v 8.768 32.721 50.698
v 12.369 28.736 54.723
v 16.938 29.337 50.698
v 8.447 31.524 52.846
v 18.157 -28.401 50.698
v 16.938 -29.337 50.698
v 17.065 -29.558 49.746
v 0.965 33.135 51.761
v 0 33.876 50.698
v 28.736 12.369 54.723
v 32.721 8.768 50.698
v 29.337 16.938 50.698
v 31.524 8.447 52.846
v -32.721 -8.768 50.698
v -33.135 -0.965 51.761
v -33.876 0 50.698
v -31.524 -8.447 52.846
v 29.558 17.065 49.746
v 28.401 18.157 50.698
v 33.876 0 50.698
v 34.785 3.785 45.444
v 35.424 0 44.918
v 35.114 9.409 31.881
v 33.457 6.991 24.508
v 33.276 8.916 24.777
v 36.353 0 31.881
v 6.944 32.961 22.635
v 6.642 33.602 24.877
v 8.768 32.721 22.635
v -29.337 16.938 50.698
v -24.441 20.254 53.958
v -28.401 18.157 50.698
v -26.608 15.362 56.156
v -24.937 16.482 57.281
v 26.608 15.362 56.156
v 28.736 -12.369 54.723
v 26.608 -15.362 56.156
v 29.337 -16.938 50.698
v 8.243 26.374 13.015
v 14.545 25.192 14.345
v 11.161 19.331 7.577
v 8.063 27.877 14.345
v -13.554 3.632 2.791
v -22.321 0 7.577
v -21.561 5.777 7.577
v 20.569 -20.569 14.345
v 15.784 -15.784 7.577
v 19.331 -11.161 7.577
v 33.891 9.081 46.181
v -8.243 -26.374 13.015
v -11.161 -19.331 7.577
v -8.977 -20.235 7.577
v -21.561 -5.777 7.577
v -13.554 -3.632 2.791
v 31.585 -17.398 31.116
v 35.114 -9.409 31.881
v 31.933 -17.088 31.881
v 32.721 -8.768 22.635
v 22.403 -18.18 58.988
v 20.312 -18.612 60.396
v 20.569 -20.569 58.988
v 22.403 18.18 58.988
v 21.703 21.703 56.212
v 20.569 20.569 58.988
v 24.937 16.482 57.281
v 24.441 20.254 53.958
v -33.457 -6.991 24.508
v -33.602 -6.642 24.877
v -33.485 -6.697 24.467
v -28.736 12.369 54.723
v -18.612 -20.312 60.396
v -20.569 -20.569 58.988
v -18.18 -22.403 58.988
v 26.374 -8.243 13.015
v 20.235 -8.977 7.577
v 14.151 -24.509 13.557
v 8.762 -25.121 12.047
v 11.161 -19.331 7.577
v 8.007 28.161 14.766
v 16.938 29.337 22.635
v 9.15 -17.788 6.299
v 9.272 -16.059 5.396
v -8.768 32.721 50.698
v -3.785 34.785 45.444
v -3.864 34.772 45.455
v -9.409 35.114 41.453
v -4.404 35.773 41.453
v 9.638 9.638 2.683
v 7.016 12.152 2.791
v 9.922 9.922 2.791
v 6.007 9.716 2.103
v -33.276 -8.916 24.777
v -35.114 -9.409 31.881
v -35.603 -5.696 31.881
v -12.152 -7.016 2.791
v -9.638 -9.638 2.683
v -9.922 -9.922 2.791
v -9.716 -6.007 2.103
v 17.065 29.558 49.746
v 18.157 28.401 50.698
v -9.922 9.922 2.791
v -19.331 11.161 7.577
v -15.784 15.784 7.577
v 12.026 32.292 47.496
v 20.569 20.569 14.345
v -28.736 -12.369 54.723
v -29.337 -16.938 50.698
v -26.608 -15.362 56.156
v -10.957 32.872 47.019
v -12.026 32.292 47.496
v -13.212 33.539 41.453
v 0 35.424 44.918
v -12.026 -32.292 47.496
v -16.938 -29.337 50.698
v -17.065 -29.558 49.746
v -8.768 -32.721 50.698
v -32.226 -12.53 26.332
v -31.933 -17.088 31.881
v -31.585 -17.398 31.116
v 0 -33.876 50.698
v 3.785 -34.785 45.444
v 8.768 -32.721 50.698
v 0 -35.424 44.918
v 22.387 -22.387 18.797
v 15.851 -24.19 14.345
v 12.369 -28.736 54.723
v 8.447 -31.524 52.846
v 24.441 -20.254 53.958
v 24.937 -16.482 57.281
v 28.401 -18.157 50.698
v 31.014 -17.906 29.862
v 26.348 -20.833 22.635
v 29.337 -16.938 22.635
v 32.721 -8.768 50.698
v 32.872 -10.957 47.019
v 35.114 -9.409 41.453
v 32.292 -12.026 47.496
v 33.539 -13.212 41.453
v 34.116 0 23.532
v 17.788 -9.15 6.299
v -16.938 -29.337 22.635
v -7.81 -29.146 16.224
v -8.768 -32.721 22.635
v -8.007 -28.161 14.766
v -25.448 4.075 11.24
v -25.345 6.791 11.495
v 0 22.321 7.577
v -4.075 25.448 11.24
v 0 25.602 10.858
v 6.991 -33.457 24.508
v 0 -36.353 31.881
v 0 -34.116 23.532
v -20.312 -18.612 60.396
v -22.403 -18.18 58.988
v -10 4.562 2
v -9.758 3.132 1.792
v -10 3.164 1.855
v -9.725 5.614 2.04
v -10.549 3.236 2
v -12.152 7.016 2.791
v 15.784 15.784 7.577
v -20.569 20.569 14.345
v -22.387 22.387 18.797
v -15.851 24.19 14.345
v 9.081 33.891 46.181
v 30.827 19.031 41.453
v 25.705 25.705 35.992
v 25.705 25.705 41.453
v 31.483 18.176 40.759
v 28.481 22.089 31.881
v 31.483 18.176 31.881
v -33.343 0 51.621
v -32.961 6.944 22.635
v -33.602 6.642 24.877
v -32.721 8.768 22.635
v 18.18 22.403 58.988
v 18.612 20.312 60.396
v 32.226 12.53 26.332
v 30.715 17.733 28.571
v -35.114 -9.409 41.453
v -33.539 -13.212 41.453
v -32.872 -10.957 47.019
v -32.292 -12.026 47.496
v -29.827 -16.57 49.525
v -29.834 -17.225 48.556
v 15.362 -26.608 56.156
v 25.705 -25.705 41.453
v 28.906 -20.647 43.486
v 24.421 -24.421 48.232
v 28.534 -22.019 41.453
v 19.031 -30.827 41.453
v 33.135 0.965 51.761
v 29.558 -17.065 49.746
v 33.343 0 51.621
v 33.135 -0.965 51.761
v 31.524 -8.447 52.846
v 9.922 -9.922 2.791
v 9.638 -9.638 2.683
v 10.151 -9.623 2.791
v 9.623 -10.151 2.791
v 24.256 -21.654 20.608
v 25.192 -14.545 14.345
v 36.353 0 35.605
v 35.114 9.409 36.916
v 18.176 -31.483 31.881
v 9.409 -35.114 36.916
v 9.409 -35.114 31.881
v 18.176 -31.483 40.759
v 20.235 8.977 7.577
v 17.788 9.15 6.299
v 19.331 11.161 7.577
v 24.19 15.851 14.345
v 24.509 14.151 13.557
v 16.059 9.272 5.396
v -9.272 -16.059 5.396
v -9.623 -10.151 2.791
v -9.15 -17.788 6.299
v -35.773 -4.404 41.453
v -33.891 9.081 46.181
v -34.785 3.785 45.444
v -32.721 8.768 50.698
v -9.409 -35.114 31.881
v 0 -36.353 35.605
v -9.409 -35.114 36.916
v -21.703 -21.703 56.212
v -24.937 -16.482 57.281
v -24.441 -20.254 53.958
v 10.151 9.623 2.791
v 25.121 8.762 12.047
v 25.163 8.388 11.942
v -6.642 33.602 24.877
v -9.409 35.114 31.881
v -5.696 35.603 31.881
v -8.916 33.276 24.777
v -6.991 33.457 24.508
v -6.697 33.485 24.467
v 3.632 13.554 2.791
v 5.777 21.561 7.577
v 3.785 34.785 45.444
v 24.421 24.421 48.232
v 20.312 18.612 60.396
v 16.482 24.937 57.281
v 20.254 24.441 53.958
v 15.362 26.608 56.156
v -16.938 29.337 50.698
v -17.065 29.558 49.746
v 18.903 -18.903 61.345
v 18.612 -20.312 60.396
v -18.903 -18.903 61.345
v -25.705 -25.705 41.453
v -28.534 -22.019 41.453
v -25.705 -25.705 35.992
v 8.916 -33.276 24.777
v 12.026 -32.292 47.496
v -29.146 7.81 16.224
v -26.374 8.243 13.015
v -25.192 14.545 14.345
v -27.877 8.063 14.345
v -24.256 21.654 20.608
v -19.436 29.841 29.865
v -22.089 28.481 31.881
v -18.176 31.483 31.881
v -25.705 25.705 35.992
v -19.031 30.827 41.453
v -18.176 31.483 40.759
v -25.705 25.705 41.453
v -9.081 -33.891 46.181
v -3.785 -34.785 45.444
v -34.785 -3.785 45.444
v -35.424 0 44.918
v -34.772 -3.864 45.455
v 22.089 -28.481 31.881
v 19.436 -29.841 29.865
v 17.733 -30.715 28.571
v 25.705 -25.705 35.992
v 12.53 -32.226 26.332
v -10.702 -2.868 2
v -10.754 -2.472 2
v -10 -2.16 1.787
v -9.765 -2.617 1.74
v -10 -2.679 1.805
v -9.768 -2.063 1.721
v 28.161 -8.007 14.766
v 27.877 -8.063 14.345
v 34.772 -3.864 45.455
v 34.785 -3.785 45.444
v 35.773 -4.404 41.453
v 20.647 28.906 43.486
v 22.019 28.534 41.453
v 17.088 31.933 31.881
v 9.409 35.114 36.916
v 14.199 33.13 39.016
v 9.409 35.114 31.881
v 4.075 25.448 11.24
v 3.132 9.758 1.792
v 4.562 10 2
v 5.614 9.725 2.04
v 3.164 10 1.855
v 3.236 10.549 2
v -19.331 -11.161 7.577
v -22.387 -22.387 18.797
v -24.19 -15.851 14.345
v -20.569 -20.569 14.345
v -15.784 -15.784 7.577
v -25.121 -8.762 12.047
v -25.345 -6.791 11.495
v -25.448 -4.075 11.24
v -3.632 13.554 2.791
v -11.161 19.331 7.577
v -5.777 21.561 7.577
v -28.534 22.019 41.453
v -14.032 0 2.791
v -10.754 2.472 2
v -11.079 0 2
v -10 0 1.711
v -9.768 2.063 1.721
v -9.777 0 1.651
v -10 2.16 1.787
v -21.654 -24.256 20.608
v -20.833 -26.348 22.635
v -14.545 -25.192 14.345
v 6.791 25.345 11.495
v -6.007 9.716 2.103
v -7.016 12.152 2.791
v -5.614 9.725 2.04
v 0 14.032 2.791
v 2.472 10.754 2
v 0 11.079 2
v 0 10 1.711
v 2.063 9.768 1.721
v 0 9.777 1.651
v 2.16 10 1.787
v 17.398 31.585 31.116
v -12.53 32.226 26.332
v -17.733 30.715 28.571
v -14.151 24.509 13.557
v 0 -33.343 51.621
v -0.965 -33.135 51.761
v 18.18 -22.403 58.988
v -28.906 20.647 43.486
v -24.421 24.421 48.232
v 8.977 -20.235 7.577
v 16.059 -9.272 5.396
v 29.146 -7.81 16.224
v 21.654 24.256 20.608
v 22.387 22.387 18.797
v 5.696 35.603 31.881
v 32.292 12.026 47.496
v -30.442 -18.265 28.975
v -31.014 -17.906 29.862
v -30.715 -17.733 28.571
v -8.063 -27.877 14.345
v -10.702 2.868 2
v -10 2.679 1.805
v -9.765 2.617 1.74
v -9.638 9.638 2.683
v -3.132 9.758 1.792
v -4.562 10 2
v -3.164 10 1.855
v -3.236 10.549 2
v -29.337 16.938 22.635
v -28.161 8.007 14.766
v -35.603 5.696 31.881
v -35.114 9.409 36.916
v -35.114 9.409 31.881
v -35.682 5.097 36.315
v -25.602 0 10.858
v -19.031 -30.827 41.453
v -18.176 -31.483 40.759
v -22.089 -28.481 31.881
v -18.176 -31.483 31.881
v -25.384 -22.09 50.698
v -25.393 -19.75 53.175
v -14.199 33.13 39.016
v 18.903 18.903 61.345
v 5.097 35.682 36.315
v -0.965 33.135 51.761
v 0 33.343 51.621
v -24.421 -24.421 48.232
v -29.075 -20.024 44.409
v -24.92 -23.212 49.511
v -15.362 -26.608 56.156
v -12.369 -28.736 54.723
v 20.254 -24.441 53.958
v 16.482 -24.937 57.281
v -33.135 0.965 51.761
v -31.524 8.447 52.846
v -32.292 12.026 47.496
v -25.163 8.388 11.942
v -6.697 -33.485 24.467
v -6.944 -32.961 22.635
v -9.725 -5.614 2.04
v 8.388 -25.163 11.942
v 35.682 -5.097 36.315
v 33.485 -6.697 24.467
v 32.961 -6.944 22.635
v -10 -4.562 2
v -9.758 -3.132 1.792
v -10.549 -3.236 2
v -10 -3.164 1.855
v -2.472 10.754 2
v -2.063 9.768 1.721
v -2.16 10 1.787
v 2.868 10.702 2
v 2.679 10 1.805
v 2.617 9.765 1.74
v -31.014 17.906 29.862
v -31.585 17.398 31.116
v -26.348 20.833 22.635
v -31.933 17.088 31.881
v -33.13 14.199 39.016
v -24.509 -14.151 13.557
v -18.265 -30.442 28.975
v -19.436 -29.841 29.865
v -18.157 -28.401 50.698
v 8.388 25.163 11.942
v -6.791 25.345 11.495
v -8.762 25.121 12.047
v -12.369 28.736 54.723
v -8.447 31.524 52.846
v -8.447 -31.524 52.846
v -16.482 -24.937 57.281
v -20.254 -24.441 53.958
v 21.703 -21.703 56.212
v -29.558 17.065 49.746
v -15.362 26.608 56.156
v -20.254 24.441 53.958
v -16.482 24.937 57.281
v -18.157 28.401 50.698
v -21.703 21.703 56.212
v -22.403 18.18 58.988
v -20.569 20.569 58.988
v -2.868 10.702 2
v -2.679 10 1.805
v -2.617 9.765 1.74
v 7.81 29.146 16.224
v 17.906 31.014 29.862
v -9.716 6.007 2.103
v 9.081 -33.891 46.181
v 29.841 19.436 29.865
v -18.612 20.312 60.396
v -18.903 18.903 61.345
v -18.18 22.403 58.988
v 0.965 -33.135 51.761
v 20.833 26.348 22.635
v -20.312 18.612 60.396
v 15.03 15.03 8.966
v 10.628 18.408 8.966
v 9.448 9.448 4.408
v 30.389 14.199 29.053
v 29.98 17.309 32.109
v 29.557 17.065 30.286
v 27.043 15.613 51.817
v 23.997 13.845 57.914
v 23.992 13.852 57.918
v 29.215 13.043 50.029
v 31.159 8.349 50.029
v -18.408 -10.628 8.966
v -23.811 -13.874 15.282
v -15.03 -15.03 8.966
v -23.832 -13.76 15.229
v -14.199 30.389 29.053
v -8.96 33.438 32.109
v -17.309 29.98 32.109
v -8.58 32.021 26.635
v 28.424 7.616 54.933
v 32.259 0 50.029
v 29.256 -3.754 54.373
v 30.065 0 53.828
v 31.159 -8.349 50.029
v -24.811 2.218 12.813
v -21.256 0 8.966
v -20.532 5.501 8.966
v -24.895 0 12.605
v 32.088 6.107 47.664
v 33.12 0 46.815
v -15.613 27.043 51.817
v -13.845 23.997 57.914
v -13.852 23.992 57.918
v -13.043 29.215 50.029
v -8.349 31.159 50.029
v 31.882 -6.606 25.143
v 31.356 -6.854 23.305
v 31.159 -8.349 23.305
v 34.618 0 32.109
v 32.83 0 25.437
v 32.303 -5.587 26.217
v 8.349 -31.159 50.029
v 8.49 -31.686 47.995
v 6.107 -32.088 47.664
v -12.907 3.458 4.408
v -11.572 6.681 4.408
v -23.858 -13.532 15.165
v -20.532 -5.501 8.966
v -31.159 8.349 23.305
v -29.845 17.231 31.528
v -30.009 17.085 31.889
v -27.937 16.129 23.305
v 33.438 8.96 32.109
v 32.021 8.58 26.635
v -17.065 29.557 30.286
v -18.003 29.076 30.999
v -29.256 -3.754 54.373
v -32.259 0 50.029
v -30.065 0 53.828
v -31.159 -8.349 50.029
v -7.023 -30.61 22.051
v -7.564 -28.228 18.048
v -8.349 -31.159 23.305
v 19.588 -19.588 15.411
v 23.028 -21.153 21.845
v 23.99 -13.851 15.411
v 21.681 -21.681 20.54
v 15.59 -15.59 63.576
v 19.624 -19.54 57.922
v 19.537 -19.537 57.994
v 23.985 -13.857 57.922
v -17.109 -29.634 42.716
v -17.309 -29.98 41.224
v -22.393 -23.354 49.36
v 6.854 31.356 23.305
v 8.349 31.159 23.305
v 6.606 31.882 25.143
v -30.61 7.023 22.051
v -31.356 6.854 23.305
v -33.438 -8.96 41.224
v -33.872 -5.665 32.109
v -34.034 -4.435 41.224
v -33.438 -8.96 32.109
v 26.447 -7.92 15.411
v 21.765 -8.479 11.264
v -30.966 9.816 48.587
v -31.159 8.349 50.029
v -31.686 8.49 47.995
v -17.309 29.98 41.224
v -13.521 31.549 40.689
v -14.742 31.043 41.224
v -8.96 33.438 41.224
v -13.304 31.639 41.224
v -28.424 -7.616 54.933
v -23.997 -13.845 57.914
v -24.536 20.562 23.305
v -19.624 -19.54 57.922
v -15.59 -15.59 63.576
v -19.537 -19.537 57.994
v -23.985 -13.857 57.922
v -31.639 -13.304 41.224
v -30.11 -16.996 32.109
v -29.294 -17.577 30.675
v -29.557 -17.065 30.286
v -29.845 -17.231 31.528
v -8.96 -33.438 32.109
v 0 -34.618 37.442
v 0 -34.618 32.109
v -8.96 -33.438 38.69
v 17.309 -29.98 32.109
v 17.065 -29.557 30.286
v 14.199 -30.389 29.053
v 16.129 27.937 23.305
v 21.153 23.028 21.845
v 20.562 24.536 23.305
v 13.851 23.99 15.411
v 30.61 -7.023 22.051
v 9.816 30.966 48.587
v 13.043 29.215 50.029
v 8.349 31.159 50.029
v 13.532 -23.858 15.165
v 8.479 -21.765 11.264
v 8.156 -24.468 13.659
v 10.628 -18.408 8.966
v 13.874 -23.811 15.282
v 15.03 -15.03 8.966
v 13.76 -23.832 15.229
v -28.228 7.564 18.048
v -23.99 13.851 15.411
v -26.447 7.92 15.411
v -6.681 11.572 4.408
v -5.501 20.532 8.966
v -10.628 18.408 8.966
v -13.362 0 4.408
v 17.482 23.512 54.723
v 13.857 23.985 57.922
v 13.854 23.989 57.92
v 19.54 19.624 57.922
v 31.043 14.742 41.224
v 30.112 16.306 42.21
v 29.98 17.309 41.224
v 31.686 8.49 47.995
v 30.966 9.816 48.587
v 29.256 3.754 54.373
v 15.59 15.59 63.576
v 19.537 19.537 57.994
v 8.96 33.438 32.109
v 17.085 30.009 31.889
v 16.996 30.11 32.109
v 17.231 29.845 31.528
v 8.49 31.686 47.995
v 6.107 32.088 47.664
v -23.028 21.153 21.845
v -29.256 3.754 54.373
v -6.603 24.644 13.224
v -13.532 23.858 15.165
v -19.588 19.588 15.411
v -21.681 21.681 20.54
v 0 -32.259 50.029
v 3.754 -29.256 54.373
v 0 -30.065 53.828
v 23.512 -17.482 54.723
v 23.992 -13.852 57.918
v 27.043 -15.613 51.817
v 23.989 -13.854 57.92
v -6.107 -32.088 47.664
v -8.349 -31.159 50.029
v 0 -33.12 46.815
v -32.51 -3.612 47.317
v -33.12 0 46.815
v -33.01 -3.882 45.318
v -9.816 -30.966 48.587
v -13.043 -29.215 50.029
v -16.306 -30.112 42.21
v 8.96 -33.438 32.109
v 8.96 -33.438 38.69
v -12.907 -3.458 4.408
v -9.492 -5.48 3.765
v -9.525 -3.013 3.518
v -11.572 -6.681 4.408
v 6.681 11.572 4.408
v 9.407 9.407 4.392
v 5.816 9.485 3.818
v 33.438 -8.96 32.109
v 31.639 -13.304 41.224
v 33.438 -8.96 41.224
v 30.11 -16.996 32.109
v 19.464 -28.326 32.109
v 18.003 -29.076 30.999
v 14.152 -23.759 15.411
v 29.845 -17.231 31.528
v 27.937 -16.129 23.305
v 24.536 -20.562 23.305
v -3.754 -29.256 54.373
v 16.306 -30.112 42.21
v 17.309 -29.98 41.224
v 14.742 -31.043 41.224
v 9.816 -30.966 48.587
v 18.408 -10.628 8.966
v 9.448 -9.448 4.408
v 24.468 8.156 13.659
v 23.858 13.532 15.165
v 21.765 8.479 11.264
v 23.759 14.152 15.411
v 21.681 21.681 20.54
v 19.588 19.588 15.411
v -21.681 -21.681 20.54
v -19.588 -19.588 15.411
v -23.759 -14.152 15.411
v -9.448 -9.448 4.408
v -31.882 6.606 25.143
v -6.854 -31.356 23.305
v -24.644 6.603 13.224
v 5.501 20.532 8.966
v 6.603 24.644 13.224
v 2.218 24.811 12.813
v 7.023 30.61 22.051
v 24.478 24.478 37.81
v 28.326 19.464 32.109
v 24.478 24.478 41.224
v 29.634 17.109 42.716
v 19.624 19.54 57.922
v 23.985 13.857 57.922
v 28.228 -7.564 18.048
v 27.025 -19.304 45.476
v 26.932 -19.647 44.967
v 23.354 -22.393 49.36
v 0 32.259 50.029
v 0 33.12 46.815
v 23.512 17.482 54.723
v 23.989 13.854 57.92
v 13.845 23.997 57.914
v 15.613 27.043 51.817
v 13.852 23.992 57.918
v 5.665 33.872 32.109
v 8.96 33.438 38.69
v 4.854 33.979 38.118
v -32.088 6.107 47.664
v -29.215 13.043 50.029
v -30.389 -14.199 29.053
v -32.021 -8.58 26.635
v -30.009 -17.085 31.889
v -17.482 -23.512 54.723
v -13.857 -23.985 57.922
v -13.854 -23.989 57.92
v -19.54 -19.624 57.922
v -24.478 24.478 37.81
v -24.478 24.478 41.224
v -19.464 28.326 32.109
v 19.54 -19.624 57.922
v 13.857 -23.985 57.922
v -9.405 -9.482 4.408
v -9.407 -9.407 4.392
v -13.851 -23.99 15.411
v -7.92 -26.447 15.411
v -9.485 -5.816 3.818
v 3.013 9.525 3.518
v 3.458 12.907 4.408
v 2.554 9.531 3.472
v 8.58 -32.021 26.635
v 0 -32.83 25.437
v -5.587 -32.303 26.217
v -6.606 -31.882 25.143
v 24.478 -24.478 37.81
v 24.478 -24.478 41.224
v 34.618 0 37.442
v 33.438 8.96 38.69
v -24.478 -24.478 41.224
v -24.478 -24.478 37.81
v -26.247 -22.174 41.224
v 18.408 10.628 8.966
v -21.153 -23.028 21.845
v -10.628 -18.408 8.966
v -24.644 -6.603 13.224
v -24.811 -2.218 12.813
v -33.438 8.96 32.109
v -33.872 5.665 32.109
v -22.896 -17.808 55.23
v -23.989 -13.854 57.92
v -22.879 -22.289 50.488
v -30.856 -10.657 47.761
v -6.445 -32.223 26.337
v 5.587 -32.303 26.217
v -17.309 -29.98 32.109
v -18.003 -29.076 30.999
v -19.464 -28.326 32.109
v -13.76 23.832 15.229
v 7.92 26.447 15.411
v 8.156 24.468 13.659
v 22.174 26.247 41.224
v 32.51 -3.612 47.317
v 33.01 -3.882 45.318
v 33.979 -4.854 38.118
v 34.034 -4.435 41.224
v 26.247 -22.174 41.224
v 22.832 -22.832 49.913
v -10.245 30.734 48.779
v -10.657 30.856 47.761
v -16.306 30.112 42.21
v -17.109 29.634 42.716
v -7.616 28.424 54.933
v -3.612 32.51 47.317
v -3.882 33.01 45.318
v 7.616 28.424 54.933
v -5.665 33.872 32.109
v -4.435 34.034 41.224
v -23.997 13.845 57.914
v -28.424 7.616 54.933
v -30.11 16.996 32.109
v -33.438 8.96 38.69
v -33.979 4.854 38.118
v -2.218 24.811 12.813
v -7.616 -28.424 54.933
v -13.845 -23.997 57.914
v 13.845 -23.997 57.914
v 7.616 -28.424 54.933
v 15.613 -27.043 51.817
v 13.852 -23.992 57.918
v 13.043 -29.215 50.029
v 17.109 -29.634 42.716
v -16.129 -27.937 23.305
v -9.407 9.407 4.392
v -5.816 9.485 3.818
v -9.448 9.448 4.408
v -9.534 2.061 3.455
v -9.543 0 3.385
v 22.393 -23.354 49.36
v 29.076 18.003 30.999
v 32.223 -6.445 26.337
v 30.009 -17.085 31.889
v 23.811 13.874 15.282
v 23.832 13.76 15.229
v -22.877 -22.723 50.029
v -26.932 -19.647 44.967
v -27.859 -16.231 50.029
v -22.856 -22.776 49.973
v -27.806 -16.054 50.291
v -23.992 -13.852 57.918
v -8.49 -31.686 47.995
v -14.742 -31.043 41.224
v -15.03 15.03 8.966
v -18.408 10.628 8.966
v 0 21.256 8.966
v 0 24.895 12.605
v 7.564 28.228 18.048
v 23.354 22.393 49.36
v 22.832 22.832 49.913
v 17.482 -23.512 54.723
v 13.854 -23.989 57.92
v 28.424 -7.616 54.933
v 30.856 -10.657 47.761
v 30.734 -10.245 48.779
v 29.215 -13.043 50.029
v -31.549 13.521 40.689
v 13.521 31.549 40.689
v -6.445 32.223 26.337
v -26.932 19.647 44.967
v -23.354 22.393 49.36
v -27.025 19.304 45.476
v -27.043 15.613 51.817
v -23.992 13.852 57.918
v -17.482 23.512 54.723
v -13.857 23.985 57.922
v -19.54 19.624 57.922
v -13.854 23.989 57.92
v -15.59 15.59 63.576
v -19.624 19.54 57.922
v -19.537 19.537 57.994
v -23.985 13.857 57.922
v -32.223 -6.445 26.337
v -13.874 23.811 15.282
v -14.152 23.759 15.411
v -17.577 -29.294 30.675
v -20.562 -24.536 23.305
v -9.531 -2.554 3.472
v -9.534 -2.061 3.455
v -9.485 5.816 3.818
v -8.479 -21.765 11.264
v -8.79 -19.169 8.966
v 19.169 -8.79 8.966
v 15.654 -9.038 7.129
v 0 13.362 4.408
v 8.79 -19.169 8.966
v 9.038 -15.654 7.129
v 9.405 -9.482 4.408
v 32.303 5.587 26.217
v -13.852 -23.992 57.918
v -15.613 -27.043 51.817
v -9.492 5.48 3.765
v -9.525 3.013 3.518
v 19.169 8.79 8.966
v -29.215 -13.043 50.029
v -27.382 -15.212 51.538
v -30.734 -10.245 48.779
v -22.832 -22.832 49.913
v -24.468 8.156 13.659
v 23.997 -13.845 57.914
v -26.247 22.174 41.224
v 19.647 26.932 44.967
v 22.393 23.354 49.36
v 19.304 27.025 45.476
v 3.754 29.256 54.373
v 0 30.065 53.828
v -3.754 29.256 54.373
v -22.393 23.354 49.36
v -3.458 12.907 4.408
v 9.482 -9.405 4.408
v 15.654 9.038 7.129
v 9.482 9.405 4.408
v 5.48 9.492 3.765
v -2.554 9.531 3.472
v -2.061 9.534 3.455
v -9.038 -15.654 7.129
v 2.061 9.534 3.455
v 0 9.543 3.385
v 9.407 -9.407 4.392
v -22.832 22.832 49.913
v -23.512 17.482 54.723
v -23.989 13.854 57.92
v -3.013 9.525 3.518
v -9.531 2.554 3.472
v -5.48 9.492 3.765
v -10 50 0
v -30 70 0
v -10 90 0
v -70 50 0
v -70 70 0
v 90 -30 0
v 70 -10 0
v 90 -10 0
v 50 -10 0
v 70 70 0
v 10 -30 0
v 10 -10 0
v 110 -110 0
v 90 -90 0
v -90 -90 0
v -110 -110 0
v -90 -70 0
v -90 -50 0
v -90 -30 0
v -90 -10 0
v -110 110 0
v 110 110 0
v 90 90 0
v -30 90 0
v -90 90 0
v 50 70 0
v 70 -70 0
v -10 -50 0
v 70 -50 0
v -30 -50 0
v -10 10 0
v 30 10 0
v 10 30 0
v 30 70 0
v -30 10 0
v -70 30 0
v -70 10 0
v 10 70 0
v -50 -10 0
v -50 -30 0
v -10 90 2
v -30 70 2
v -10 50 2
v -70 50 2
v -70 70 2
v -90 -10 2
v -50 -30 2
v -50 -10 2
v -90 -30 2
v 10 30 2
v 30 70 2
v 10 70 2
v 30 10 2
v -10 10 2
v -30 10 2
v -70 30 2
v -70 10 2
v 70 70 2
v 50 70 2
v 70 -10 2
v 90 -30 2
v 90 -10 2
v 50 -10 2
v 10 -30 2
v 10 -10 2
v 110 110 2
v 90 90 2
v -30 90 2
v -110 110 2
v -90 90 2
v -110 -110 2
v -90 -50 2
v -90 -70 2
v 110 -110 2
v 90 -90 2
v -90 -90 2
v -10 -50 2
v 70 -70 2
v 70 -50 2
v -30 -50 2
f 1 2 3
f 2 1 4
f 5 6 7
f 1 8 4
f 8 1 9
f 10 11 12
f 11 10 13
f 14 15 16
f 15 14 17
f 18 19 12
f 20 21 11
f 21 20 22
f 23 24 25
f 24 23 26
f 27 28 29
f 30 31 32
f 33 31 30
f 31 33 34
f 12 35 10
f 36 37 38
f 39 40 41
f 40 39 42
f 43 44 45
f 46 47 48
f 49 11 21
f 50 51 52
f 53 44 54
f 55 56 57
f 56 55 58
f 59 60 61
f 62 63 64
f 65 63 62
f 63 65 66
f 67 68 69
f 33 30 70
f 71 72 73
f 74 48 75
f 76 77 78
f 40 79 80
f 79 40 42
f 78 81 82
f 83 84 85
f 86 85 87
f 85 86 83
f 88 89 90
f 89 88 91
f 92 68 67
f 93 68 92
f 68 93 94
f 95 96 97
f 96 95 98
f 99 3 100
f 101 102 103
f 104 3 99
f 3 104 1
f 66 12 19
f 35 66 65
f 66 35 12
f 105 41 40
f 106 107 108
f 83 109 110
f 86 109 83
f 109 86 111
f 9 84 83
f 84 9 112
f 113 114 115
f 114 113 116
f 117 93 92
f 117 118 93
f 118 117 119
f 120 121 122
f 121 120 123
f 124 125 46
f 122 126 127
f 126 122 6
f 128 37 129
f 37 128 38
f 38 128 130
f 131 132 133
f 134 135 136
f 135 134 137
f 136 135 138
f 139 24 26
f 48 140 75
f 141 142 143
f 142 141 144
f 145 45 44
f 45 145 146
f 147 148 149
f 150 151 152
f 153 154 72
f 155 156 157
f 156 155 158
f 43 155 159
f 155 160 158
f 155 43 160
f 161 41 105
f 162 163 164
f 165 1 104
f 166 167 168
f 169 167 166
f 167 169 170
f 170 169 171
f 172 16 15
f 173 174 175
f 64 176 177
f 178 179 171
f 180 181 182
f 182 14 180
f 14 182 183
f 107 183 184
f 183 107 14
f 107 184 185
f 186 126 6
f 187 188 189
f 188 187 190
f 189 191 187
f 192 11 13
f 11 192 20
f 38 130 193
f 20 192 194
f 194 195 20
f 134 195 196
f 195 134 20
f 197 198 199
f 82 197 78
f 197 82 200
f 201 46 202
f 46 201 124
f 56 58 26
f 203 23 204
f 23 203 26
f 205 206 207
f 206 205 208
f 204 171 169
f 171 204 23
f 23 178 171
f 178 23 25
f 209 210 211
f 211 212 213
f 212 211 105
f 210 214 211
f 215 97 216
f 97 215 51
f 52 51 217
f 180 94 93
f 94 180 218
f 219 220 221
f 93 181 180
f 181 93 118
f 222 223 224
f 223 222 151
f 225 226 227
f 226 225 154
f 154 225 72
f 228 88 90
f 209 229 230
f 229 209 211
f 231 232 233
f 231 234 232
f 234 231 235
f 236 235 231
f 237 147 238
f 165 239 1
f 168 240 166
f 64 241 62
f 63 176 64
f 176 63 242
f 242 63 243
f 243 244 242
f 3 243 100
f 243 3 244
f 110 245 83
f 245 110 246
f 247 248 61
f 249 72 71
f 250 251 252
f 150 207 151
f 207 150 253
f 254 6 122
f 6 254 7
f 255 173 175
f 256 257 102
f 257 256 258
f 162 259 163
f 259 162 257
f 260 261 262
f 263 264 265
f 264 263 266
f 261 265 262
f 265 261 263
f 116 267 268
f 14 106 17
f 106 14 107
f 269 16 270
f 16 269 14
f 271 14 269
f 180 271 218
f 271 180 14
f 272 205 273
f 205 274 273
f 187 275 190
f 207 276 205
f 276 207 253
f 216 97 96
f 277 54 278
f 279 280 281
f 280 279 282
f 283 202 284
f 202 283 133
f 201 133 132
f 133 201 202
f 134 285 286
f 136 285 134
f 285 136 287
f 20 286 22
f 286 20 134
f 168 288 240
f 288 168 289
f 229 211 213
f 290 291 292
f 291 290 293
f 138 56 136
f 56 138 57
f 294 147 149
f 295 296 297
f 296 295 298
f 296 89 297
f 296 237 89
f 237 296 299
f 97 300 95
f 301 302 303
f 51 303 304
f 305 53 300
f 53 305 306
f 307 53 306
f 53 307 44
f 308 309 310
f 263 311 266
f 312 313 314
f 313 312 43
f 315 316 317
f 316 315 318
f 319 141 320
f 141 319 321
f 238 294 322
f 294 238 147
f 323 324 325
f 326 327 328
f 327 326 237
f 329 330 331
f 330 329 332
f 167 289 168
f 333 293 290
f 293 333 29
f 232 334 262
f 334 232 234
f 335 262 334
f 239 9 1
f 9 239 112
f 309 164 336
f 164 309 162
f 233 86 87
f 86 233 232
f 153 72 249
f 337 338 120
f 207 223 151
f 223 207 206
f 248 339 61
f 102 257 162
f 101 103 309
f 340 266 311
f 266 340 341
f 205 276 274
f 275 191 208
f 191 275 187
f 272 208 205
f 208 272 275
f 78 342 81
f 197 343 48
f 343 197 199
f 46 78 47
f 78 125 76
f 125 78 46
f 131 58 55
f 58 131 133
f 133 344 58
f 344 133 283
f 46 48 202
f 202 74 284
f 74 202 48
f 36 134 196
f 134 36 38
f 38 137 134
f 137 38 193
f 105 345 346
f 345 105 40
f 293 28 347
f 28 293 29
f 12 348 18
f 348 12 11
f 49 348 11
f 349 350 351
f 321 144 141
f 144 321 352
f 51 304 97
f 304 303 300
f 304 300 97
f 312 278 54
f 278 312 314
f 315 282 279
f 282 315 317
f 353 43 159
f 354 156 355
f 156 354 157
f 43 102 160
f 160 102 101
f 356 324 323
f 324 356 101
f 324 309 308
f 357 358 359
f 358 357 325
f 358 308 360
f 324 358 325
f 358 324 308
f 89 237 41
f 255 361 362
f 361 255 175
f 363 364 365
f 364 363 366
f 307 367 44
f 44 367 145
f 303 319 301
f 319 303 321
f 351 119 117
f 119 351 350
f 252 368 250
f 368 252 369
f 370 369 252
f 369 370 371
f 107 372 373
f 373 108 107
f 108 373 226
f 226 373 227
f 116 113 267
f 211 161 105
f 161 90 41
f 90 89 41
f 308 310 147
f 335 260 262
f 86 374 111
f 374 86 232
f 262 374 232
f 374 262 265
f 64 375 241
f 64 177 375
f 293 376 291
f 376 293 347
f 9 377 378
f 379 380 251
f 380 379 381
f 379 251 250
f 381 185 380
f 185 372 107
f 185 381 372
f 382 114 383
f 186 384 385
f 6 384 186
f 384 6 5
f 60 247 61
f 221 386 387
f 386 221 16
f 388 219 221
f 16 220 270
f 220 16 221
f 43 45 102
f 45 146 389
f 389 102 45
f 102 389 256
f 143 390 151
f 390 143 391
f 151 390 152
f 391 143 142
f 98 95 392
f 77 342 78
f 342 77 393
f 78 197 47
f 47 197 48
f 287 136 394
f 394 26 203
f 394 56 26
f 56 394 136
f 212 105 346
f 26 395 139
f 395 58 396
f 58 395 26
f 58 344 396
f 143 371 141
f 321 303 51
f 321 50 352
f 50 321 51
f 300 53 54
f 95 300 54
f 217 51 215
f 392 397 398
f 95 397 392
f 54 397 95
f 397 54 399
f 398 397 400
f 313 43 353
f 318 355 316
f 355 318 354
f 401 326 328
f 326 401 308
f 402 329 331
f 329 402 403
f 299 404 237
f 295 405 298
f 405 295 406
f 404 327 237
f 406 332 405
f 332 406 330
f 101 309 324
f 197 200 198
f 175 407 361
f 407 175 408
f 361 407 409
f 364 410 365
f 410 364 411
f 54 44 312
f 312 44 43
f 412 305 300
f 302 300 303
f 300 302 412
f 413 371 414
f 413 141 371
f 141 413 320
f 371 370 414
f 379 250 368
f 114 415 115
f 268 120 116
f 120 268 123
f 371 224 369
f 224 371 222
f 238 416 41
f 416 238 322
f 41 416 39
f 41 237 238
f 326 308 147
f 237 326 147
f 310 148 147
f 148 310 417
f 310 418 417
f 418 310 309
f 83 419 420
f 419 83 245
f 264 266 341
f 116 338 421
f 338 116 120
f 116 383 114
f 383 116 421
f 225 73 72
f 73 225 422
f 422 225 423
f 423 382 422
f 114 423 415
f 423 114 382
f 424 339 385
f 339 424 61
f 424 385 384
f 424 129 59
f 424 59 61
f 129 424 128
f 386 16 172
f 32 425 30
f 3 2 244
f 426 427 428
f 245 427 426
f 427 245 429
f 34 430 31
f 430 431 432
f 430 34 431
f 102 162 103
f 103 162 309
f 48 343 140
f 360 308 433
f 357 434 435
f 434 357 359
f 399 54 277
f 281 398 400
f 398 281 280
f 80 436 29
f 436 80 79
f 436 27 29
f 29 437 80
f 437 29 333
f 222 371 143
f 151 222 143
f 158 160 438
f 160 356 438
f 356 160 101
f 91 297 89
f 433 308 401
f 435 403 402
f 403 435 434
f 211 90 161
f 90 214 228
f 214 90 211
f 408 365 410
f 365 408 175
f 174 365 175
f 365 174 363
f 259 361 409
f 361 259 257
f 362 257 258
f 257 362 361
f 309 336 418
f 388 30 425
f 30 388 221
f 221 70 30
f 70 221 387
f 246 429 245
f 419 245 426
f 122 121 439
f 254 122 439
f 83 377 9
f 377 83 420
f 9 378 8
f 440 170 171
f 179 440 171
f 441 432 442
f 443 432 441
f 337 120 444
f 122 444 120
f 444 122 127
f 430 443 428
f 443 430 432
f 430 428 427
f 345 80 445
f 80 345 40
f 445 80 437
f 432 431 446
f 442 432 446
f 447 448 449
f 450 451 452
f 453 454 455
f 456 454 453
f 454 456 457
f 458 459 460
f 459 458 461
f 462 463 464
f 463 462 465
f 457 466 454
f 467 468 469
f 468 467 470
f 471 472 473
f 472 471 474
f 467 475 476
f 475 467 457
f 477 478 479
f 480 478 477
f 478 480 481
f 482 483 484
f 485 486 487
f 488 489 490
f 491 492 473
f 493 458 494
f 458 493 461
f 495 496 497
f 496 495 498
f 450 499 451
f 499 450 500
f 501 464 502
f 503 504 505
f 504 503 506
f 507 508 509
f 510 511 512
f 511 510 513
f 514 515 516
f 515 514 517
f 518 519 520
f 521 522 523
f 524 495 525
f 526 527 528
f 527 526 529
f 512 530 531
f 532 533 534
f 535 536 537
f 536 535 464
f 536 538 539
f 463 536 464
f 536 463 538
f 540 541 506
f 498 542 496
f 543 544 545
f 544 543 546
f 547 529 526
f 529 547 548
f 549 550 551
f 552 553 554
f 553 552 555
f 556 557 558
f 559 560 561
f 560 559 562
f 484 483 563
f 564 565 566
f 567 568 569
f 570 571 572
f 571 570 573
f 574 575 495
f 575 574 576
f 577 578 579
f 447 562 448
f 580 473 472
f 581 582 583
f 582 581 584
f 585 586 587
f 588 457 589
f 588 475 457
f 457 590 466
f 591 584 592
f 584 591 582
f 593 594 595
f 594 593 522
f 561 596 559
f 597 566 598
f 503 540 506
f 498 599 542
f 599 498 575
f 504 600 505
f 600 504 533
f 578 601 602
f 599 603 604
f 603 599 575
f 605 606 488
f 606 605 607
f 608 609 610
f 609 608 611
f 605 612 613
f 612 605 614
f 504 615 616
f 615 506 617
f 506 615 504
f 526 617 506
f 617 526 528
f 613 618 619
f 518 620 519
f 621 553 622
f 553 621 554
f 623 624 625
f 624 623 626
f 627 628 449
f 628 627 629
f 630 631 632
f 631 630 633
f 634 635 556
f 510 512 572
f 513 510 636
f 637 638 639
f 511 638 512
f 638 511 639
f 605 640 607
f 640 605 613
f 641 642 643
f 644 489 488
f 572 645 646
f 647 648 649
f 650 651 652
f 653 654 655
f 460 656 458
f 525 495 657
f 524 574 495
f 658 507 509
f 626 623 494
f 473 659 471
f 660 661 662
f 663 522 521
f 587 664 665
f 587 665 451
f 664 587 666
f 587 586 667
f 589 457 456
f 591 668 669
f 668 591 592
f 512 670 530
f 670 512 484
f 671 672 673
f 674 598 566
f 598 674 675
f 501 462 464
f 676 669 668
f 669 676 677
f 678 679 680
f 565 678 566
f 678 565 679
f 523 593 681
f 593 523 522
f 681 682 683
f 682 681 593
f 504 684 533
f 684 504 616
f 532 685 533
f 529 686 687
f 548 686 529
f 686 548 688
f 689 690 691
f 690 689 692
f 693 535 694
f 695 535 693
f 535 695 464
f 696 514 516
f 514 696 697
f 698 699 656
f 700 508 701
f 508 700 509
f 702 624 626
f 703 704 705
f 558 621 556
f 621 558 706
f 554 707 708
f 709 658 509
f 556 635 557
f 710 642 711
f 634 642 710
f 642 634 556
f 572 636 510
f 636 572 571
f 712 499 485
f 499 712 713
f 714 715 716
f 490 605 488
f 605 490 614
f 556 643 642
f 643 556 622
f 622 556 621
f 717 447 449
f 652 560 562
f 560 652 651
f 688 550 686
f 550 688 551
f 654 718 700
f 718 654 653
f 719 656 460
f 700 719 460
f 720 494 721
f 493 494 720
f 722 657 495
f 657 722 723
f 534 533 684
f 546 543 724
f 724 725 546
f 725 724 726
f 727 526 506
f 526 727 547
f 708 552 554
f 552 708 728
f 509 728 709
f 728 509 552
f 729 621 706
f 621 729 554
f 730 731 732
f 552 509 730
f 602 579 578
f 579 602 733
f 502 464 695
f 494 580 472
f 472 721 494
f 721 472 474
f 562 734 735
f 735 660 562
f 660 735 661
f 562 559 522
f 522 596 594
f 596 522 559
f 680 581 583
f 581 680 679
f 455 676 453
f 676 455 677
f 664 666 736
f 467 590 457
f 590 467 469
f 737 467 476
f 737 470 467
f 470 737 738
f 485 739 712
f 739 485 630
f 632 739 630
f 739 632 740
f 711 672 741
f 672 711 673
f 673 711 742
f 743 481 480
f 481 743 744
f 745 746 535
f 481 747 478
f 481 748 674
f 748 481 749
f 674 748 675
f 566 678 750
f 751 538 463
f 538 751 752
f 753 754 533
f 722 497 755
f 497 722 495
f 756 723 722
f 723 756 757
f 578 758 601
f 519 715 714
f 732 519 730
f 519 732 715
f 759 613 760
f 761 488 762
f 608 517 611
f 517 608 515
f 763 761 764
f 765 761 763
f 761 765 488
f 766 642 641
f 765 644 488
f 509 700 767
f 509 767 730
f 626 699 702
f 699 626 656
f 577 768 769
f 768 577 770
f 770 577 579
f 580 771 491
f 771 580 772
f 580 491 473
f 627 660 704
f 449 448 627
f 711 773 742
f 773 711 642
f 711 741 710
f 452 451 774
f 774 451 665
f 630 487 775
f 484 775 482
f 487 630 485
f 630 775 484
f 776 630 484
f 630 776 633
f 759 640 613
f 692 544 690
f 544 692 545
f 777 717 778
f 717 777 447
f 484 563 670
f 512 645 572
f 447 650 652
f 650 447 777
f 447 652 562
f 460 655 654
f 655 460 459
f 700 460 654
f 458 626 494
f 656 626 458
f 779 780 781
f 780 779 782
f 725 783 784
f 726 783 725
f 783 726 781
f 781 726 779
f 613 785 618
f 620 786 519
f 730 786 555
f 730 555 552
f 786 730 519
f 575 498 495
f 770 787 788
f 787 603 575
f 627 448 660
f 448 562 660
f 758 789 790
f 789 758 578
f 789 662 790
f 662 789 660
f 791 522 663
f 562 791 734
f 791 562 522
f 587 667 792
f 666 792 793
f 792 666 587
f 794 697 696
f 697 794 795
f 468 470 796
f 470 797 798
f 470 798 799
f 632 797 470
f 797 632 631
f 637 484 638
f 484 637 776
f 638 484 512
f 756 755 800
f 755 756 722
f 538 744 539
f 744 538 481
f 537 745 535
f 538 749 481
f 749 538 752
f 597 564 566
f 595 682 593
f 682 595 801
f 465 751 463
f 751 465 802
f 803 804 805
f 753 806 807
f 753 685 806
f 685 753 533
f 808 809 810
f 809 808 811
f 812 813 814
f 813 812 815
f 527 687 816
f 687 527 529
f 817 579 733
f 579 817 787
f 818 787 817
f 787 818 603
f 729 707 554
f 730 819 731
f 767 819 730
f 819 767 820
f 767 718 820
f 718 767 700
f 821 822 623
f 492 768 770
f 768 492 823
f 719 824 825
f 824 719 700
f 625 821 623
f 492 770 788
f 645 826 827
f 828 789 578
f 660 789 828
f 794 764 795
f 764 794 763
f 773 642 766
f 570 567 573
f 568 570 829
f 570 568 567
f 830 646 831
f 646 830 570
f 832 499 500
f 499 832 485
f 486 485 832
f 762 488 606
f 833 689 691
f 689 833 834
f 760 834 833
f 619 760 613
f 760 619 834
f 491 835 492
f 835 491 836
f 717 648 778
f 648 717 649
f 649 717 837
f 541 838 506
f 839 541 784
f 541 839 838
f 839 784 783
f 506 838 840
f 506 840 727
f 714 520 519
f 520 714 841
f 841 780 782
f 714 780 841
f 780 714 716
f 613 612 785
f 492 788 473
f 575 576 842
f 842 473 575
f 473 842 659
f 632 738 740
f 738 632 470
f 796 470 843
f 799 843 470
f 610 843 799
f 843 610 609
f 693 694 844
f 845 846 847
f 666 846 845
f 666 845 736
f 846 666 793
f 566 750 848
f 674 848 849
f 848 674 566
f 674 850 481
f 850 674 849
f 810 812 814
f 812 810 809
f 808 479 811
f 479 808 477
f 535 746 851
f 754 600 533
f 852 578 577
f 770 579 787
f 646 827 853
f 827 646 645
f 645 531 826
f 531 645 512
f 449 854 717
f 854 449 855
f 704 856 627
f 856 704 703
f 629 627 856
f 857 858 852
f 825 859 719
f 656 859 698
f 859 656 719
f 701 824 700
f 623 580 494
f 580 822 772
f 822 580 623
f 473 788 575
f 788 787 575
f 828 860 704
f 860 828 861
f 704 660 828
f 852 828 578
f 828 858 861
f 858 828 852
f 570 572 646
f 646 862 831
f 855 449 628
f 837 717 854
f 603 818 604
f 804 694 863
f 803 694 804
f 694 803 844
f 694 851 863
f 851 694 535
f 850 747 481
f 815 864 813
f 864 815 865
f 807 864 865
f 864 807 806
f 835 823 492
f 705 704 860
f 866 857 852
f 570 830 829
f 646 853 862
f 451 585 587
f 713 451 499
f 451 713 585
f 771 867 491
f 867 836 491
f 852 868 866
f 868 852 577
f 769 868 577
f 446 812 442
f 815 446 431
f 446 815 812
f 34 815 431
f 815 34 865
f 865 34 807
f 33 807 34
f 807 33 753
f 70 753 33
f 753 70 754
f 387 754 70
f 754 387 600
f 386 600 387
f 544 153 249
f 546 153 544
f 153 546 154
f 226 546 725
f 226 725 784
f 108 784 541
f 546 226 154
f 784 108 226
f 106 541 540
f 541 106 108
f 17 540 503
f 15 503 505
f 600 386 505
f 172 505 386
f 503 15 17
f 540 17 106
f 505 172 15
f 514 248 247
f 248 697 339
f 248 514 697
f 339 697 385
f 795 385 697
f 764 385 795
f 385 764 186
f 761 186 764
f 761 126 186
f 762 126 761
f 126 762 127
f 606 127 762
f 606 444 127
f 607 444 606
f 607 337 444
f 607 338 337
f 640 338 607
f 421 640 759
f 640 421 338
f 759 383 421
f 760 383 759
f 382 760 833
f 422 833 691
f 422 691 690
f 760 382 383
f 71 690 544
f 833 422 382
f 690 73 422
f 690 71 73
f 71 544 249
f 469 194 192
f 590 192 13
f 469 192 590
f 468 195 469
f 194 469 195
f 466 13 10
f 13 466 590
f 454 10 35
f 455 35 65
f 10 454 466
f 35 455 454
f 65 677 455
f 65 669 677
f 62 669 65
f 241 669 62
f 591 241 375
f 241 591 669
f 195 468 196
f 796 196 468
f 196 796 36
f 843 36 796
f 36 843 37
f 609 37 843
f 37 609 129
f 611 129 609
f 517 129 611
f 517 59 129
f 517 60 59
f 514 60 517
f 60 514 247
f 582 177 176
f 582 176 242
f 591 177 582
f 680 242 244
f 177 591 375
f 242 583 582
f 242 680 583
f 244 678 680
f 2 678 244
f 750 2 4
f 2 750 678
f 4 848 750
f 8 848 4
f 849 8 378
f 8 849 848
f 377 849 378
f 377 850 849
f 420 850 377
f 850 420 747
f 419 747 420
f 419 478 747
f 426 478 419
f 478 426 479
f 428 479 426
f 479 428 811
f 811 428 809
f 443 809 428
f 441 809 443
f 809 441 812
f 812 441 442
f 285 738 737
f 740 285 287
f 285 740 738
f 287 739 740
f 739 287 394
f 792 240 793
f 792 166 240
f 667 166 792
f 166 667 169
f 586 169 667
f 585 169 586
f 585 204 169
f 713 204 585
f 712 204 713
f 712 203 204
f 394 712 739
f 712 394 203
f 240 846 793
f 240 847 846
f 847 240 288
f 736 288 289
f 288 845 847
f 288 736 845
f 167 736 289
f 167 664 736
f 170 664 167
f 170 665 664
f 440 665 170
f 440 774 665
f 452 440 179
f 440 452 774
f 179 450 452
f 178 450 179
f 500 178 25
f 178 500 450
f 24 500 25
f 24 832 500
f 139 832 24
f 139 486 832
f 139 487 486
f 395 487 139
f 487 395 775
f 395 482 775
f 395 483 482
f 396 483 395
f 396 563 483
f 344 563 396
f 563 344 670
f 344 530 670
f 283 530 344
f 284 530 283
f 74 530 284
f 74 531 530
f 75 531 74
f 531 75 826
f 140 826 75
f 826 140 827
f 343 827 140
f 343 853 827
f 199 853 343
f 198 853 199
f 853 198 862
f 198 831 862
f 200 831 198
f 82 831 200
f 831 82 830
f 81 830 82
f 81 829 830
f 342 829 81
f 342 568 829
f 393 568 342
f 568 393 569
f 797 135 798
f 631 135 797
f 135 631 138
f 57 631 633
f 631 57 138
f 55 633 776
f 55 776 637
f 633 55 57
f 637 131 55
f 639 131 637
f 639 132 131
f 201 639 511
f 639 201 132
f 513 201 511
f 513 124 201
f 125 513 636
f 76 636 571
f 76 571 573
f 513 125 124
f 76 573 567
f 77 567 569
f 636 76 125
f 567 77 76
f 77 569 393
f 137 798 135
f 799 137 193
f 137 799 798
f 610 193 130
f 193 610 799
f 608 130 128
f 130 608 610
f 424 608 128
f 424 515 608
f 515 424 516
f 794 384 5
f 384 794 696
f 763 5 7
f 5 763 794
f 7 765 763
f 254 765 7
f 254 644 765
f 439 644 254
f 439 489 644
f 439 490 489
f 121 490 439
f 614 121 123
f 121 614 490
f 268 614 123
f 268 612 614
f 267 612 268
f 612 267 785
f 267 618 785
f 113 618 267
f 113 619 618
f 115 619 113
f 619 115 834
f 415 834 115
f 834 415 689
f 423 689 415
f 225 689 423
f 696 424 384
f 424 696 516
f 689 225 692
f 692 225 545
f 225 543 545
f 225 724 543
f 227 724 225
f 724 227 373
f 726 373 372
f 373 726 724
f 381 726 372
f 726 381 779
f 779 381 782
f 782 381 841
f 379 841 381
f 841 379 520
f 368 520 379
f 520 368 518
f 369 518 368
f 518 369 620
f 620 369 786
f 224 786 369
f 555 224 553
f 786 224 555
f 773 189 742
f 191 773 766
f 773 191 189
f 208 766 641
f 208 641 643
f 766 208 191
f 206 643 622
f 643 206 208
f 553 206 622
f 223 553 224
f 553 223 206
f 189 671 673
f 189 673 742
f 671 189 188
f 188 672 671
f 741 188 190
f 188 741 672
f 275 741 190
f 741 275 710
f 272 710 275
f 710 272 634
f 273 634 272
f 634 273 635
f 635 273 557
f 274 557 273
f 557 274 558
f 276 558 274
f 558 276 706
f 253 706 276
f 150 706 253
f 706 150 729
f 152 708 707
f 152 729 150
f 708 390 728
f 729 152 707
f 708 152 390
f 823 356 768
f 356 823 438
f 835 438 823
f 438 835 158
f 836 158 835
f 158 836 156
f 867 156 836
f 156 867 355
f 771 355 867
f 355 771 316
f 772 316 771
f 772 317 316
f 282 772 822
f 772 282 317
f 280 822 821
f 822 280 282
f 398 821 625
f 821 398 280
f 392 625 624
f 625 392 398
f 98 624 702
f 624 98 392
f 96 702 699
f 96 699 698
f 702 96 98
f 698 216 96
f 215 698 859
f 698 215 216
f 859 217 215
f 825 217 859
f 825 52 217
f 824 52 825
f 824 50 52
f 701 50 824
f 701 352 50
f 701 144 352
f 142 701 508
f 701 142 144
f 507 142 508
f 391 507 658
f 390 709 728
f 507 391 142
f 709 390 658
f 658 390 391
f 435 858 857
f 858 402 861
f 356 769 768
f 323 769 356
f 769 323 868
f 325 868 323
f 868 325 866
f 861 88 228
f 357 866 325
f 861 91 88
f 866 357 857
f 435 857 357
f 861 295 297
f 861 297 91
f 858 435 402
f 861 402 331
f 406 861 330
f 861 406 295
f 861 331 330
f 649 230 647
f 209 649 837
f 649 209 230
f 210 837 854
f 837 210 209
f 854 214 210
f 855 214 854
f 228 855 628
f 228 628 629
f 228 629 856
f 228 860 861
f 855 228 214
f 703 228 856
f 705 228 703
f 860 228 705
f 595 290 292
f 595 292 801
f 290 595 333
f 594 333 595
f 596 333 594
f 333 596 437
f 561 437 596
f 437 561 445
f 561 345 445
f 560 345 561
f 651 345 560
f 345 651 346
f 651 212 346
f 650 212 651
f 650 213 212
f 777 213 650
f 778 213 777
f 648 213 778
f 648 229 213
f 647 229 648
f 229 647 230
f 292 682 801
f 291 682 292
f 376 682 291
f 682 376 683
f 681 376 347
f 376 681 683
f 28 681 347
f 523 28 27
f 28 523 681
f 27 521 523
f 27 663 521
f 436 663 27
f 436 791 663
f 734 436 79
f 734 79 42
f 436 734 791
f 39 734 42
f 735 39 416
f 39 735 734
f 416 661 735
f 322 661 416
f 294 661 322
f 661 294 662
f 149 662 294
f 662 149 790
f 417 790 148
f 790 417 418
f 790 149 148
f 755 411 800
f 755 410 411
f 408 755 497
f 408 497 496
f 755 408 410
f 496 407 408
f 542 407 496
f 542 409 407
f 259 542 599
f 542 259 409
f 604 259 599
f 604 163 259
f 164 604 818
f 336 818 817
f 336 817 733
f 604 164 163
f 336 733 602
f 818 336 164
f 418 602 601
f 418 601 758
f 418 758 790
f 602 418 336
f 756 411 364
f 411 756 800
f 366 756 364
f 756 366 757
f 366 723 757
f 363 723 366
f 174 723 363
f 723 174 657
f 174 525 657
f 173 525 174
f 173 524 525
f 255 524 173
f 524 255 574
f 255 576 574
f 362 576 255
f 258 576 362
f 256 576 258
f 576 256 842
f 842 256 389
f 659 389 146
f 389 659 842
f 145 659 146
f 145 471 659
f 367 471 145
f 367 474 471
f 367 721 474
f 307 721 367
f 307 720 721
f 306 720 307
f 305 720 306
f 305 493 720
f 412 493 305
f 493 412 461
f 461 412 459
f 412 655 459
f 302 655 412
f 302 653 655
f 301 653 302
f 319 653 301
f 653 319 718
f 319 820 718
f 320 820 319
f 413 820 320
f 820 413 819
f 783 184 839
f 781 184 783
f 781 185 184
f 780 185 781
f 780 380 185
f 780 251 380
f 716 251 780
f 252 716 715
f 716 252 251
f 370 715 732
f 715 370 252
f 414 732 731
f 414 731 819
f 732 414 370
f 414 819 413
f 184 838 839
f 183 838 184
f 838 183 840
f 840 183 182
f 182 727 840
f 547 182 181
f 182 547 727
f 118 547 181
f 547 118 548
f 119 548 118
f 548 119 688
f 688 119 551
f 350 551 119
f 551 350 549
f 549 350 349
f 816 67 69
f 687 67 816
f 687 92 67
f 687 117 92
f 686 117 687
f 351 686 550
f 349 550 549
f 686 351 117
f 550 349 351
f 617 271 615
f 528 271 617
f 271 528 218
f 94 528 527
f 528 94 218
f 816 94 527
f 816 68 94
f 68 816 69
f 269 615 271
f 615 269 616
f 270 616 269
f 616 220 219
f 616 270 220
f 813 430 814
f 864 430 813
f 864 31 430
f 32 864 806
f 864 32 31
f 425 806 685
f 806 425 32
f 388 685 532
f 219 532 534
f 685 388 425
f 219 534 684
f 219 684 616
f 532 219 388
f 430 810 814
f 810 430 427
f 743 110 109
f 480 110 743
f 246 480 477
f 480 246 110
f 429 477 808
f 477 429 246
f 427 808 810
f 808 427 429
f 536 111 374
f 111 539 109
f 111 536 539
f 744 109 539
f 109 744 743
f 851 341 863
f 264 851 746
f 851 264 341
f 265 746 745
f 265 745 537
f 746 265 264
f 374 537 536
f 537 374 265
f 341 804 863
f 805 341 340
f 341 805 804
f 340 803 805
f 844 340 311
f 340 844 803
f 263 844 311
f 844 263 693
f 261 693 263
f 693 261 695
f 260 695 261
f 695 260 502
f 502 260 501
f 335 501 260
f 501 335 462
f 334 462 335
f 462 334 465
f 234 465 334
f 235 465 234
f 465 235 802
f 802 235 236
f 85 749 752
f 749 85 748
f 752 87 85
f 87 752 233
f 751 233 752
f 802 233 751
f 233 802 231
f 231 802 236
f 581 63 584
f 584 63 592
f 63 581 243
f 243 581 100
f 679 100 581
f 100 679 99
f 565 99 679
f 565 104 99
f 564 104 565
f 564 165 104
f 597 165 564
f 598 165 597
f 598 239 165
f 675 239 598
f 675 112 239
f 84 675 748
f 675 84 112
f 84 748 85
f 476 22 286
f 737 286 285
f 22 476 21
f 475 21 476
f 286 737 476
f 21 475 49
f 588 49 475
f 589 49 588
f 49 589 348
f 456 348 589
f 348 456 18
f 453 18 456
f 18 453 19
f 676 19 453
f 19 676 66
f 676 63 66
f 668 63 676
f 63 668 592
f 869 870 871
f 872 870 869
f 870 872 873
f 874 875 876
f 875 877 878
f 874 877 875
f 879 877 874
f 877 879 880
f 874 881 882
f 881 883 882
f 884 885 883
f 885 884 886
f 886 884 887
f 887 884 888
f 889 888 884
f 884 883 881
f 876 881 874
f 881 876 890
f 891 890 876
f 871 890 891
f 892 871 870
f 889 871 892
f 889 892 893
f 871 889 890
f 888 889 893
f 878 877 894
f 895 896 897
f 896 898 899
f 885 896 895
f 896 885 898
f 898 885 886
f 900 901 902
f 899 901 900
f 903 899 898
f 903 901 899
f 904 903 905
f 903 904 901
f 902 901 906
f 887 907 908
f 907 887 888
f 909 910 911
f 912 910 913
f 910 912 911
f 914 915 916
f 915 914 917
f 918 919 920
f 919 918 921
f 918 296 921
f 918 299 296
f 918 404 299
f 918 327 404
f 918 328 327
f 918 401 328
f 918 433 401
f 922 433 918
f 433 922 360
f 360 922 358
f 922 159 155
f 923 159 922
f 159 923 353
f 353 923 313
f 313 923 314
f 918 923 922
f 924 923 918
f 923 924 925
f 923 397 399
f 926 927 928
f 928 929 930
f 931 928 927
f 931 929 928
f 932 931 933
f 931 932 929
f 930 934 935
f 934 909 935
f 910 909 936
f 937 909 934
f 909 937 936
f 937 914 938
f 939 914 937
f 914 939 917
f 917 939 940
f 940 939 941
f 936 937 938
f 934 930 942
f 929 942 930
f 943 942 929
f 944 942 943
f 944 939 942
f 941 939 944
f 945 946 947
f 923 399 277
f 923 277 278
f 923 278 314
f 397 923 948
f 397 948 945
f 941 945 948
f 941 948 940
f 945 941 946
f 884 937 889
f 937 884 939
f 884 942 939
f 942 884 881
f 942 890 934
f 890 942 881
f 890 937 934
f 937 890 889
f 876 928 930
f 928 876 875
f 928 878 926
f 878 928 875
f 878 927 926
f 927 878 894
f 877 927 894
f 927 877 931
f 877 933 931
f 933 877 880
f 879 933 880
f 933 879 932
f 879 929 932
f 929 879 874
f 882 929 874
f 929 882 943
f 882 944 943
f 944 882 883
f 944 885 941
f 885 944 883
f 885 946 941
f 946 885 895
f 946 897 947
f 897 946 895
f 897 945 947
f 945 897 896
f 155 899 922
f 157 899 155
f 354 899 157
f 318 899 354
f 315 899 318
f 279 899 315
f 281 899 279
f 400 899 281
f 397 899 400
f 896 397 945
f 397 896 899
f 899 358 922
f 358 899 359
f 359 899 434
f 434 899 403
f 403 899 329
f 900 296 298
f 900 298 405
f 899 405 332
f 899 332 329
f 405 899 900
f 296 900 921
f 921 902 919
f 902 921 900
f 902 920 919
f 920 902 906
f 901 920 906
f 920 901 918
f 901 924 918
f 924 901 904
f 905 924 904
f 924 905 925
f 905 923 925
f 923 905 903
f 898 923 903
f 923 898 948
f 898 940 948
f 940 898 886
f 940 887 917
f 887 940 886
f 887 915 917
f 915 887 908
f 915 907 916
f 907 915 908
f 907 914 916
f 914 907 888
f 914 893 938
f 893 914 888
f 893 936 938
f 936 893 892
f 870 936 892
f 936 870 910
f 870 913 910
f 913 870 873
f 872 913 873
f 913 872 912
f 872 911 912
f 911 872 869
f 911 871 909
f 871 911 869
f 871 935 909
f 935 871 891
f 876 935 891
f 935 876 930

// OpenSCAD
maze_rows = 5;
block_width = 40;
wall_thickness = 20;
fn = 24;
shadow = "YES"; // [YES, NO]
wall_height = 2;

// draw a line between point [x1, y1] and [x2, y2].
module line(point1, point2, width = 1, cap_round = true) {
    angle = 90 - atan((point2[1] - point1[1]) / (point2[0] - point1[0]));
    offset_x = 0.5 * width * cos(angle);
    offset_y = 0.5 * width * sin(angle);

    offset1 = [-offset_x, offset_y];
    offset2 = [offset_x, -offset_y];

    if(cap_round) {
        translate(point1) rotate(45) circle(d = width * sqrt(2), $fn = 4);
        translate(point2) rotate(45) circle(d = width * sqrt(2), $fn = 4);
    }

    polygon(points=[
        point1 + offset1, point2 + offset1,  
        point2 + offset2, point1 + offset2
    ]);
}

// Constants for wall types

NO_WALL = 0;       
UPPER_WALL = 1;    
RIGHT_WALL = 2;    
UPPER_RIGHT_WALL = 3; 

function block_data(x, y, wall_type, visited) = [x, y, wall_type, visited];
function get_x(block_data) = block_data[0];
function get_y(block_data) = block_data[1];
function get_wall_type(block_data) = block_data[2];

module draw_block(wall_type, block_width, wall_thickness) {
    if(wall_type == UPPER_WALL || wall_type == UPPER_RIGHT_WALL) {
        // draw a upper wall
        line(
            [0, block_width], [block_width, block_width], wall_thickness
        ); 
    }
    
    if(wall_type == RIGHT_WALL || wall_type == UPPER_RIGHT_WALL) {
        // draw a right wall
        line(
            [block_width, block_width], [block_width, 0], wall_thickness
        ); 
    }
}

module draw_maze(rows, columns, blocks, block_width, wall_thickness) {
    for(block = blocks) {
        // move a block to a right position.
        translate([get_x(block) - 1, get_y(block) - 1] * block_width) 
            draw_block(
                get_wall_type(block), 
                block_width, 
                wall_thickness
            );
    }

    // the lowermost wall
    line([0, 0], [block_width * columns, 0], 
         wall_thickness);
    // the leftmost wall
    line([0, block_width], [0, block_width * rows], 
         wall_thickness);
} 

// create a starting maze for being visited later.
function starting_maze(rows, columns) =  [
    for(y = [1:rows]) 
        for(x = [1:columns]) 
            block_data(
                x, y, 
                // all blocks have upper and right walls except the exit
                y == rows && x == columns ? UPPER_WALL : UPPER_RIGHT_WALL, 
                // unvisited
                false 
            )
];

// find out the index of a block with the position (x, y)
function indexOf(x, y, maze, i = 0) =
    i > len(maze) ? -1 : (
        [get_x(maze[i]), get_y(maze[i])] == [x, y] ? i : 
            indexOf(x, y, maze, i + 1)
    );

// is (x, y) visited?
function visited(x, y, maze) = maze[indexOf(x, y, maze)][3];

// is (x, y) visitable?
function visitable(x, y, maze, rows, columns) = 
    y > 0 && y <= rows &&     // y bound
    x > 0 && x <= columns &&  // x bound
    !visited(x, y, maze);     // unvisited

// setting (x, y) as being visited
function set_visited(x, y, maze) = [
    for(b = maze) 
        [x, y] == [get_x(b), get_y(b)] ? 
            [x, y, get_wall_type(b), true] : b
];
    
// 0（right）、1（upper）、2（left）、3（down）
function rand_dirs() =
    [
        [0, 1, 2, 3],
        [0, 1, 3, 2],
        [0, 2, 1, 3],
        [0, 2, 3, 1],
        [0, 3, 1, 2],
        [0, 3, 2, 1],
        [1, 0, 2, 3],
        [1, 0, 3, 2],
        [1, 2, 0, 3],
        [1, 2, 3, 0],
        [1, 3, 0, 2],
        [1, 3, 2, 0],
        [2, 0, 1, 3],
        [2, 0, 3, 1],
        [2, 1, 0, 3],
        [2, 1, 3, 0],
        [2, 3, 0, 1],
        [2, 3, 1, 0],
        [3, 0, 1, 2],
        [3, 0, 2, 1],
        [3, 1, 0, 2],
        [3, 1, 2, 0],
        [3, 2, 0, 1],
        [3, 2, 1, 0]
    ][round(rands(0, 24, 1)[0])]; 

// get x value by dir
function next_x(x, dir) = x + [1, 0, -1, 0][dir];
// get y value by dir
function next_y(y, dir) = y + [0, 1, 0, -1][dir];

// go right and carve the right wall
function go_right_from(x, y, maze) = [
    for(b = maze) [get_x(b), get_y(b)] == [x, y] ? (
        get_wall_type(b) == UPPER_RIGHT_WALL ? 
            [x, y, UPPER_WALL, visited(x, y, maze)] : 
            [x, y, NO_WALL, visited(x, y, maze)]
        
    ) : b
]; 

// go up and carve the upper wall
function go_up_from(x, y, maze) = [
    for(b = maze) [get_x(b), get_y(b)] == [x, y] ? (
        get_wall_type(b) == UPPER_RIGHT_WALL ? 
            [x, y, RIGHT_WALL, visited(x, y, maze)] :  
            [x, y, NO_WALL, visited(x, y, maze)]
        
    ) : b
]; 

// go left and carve the right wall of the left block
function go_left_from(x, y, maze) = [
    for(b = maze) [get_x(b), get_y(b)] == [x - 1, y] ? (
        get_wall_type(b) == UPPER_RIGHT_WALL ? 
            [x - 1, y, UPPER_WALL, visited(x - 1, y, maze)] : 
            [x - 1, y, NO_WALL, visited(x - 1, y, maze)]
    ) : b
]; 

// go down and carve the upper wall of the down block
function go_down_from(x, y, maze) = [
    for(b = maze) [get_x(b), get_y(b)] == [x, y - 1] ? (
        get_wall_type(b) == UPPER_RIGHT_WALL ? 
            [x, y - 1, RIGHT_WALL, visited(x, y - 1, maze)] : 
            [x, y - 1, NO_WALL, visited(x, y - 1, maze)]
    ) : b
]; 

// 0（right）、1（upper）、2（left）、3（down）
function try_block(dir, x, y, maze, rows, columns) =
    dir == 0 ? go_right_from(x, y, maze) : (
        dir == 1 ? go_up_from(x, y, maze) : (
            dir == 2 ? go_left_from(x, y, maze) : 
                 go_down_from(x, y, maze)   // 這時 dir 一定是 3
            
        ) 
    );


// find out visitable dirs from (x, y)
function visitable_dirs_from(x, y, maze, rows, columns) = [
    for(dir = [0, 1, 2, 3]) 
        if(visitable(next_x(x, dir), next_y(y, dir), maze, maze_rows, columns)) 
            dir
];  
    
// go maze from (x, y)
function go_maze(x, y, maze, rows, columns) = 
    //  have visitable dirs?
    len(visitable_dirs_from(x, y, maze, rows, columns)) == 0 ? 
        set_visited(x, y, maze)      // road closed
        : walk_around_from(          
            x, y, 
            rand_dirs(),             
            set_visited(x, y, maze), 
            rows, columns
        );

// try four directions
function walk_around_from(x, y, dirs, maze, rows, columns, i = 4) =
    // all done?
    i > 0 ? 
        // not yet
        walk_around_from(x, y, dirs, 
            // try one direction
            try_routes_from(x, y, dirs[4 - i], maze, rows, columns),  
            , rows, columns, 
            i - 1) 
        : maze;
        
function try_routes_from(x, y, dir, maze, rows, columns) = 
    // is the dir visitable?
    visitable(next_x(x, dir), next_y(y, dir), maze, rows, columns) ?     
        // try the block 
        go_maze(
            next_x(x, dir), next_y(y, dir), 
            try_block(dir, x, y, maze, rows, columns),
            rows, columns
        ) 
        // road closed so return maze directly
        : maze;   

module pyramid_with_stairs(base_width, wall_thickness, rows) {
    height = base_width * sqrt(2) / 2;

    module floor(i) {
        base_w = base_width - (base_width / rows) * (i - 1) + wall_thickness;
        floor_h = height / rows * 2;
                
        stairsteps = rows;
        staircase_h = floor_h / stairsteps;
        staircase_w = wall_thickness / stairsteps * 2;
        
        translate([0, 0, floor_h / 2 * (i - 1)]) 
            for(j = [1:stairsteps]) {
                square_w = base_w - j * staircase_w;
                translate([0, 0, staircase_h * (j - 1)])  
                    linear_extrude(staircase_h) 
                        square([square_w, square_w], center = true);
            }
    }
    
    for(i = [1:2:rows - 1]) {
        floor(i);
    }
}

module stereographic_projection(side_leng_shadow, fn) {
    $fn = fn;
    
    half_side_length = side_leng_shadow / 2;
    outer_sphere_r = half_side_length / 3;
    a = atan(sqrt(2) * half_side_length / (2 * outer_sphere_r));
    inner_sphere_r = outer_sphere_r * sin(a);
    
    intersection() { 
        translate([0, 0, outer_sphere_r]) difference() {
            sphere(outer_sphere_r);
            sphere(outer_sphere_r / 2 + inner_sphere_r / 2);
            
            translate([0, 0, outer_sphere_r / 2]) 
                linear_extrude(outer_sphere_r) 
                    circle(inner_sphere_r * sin(90 - a));
        }
     
        linear_extrude(outer_sphere_r * 2, scale = 0.01) children();
    }
}

module stereographic_projection_maze2(maze_rows, block_width, wall_thickness, fn, wall_height, shadow) {
    maze_blocks = go_maze(
        1, 1,   // starting point
        starting_maze(maze_rows, maze_rows),  
        maze_rows, maze_rows
    ); 
    
    length = block_width * maze_rows + wall_thickness;
    
    module maze() {
        translate([-block_width * maze_rows / 2, -block_width * maze_rows / 2, 0]) union() {
            draw_maze(
                maze_rows, 
                maze_rows, 
                maze_blocks, 
                block_width, 
                wall_thickness
            );
            
            line([0, wall_thickness], [0, wall_thickness], wall_thickness);
            
            line(
                [
                    block_width * maze_rows, 
                    block_width * (maze_rows - 1) + wall_thickness
                ], 
                [
                    block_width * maze_rows, 
                    block_width * (maze_rows - 1) + wall_thickness
                ], 
                wall_thickness
            );
        }
    }
    
    stereographic_projection(length, fn) maze();
    
    if(shadow == "YES") {
        color("black") linear_extrude(wall_height) maze();
    }
}

stereographic_projection_maze2(maze_rows, block_width, wall_thickness, fn, wall_height, shadow);
